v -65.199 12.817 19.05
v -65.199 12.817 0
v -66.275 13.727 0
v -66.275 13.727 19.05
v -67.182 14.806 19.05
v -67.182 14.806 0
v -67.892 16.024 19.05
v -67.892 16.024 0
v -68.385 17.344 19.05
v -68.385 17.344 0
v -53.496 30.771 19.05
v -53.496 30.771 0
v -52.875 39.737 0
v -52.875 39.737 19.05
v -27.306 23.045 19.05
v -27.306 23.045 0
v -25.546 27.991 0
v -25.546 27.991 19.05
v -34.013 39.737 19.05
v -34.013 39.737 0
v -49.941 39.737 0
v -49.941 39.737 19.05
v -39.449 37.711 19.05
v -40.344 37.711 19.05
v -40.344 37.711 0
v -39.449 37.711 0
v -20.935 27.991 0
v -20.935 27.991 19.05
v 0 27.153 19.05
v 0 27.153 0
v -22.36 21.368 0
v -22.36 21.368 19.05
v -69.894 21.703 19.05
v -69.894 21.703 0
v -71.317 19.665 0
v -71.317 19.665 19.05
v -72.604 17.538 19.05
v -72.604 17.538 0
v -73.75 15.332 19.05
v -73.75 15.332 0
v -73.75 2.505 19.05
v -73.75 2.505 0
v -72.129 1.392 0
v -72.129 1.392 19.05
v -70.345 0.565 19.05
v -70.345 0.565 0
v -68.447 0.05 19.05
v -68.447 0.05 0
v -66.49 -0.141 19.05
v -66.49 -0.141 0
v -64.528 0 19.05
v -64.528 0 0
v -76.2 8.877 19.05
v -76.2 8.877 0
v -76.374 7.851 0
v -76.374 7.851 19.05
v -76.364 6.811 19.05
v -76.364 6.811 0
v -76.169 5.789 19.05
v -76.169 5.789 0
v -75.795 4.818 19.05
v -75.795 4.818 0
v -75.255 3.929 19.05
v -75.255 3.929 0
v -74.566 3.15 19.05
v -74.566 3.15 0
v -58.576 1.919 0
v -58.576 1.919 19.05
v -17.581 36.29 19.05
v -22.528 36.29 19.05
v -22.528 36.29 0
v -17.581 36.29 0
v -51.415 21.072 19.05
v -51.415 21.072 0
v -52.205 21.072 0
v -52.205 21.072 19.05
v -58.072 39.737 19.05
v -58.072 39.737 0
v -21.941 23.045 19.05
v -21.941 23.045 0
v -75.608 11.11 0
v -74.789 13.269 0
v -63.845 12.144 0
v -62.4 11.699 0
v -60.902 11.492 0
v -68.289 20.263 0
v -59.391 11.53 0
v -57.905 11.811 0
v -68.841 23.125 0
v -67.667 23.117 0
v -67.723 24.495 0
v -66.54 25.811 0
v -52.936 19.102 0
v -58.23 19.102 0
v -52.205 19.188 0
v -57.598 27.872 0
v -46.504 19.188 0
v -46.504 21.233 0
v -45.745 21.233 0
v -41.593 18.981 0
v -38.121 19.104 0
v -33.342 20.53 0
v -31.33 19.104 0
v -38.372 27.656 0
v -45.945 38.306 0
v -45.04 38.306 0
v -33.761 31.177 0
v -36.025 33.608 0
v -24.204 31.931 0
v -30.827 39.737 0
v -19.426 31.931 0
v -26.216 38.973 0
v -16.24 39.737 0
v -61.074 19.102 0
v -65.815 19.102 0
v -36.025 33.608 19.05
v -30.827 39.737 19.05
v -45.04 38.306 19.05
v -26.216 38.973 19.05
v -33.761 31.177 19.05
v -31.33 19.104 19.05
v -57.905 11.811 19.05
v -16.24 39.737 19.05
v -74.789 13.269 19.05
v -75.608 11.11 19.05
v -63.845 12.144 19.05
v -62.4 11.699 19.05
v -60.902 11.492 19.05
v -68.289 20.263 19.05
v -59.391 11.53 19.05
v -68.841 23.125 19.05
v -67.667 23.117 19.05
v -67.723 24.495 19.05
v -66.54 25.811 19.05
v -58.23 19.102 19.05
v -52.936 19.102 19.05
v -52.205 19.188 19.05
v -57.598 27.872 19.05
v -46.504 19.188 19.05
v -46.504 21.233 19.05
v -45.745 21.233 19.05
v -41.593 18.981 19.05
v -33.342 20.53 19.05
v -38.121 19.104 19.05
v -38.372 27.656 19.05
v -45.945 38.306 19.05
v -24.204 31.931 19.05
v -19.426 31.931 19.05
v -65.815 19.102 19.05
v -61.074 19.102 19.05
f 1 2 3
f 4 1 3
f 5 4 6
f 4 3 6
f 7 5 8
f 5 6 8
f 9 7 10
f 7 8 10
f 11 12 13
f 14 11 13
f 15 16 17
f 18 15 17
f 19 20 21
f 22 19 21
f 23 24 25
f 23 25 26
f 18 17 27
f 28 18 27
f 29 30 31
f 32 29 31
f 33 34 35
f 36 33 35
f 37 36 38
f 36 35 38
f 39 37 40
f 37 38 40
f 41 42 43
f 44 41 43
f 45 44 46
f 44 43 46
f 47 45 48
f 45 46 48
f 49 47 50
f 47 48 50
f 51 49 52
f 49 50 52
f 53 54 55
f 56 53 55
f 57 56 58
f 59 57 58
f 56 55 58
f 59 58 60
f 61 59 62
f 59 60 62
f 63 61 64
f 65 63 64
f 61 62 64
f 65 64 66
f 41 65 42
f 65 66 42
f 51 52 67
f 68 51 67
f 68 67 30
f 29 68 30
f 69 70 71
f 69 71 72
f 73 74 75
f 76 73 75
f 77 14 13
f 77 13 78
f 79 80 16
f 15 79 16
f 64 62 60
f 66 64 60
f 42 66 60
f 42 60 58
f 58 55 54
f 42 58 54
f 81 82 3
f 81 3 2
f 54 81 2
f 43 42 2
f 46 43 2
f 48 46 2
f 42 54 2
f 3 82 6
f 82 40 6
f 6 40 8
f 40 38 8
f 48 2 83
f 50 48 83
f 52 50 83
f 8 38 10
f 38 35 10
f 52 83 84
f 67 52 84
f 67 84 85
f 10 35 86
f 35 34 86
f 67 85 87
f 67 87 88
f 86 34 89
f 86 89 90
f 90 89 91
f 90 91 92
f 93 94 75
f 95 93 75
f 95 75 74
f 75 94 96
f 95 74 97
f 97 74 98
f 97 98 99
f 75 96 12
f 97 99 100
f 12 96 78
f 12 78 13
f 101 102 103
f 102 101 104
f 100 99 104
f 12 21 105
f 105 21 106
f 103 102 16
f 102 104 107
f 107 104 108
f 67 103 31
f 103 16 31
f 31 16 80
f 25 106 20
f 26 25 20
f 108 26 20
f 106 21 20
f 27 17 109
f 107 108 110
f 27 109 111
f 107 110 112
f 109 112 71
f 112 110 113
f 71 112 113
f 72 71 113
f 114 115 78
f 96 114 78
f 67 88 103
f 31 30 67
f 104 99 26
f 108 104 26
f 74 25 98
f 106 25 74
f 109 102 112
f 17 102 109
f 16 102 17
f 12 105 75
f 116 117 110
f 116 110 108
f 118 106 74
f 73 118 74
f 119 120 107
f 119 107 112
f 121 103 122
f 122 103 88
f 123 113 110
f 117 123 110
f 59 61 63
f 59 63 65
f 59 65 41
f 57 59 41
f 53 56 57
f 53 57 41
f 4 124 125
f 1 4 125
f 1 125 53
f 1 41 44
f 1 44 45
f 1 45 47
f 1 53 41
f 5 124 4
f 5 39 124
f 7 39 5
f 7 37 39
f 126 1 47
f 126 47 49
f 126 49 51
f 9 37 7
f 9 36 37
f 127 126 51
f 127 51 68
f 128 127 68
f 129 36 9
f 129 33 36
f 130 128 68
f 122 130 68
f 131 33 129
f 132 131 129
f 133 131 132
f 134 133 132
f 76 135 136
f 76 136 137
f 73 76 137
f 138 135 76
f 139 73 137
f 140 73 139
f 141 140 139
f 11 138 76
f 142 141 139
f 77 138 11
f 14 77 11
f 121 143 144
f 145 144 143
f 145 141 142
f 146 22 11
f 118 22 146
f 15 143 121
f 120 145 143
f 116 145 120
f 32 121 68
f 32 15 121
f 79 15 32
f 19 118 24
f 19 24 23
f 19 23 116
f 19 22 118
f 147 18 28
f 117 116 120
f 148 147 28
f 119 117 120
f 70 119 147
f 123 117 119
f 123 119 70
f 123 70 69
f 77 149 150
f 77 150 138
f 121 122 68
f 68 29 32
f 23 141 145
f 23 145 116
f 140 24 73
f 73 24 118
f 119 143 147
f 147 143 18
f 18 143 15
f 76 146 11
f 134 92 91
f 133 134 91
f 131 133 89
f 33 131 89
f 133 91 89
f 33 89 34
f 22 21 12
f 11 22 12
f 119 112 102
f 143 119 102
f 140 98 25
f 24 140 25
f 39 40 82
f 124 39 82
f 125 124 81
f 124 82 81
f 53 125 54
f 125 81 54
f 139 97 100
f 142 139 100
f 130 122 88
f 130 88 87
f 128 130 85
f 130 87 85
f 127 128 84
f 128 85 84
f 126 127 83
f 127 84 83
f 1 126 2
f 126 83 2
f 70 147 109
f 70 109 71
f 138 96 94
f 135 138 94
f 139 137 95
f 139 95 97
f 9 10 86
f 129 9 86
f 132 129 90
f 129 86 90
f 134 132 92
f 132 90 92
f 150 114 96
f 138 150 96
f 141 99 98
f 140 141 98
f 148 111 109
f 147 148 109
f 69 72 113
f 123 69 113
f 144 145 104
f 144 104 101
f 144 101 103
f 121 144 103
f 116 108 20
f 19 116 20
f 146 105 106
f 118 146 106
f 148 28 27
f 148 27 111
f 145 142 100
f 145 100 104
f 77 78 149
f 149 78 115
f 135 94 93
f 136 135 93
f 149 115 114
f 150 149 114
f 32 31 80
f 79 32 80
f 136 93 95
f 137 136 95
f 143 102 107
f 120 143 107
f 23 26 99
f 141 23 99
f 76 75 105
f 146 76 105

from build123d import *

# Parameters (mm, degrees)
F1_DEPTH = 19.05
F3_DEPTH = 19.05


# Not quite as in the source:
# - a feature names something its author has since deleted; it is built from what else it names


with BuildPart() as f1:
    # F0 (on Top) → F1 (new body)
    with BuildSketch(Plane.XY):
        Polygon((-39.6296493709, 39.737109375), (-44.4920025766, 39.737109375), (-45.0404509902, 38.3060877886), (-51.4150857925, 21.0715923085), (-52.2047057748, 19.1882997751), (-47.2585186362, 19.1882997751), (-46.5040132403, 21.2327073224), (-40.3436794877, 37.7105511725), align=None)
    extrude(amount=F1_DEPTH)



with BuildPart() as f1b:
    # F0 (on Top) → F1, piece 2 (new body)
    with BuildSketch(Plane.XY):
        Polygon((-52.8753772378, 39.737109375), (-58.071937412, 39.737109375), (-65.8153370023, 19.1017910838), (-61.0744804144, 19.1017910838), (-57.5978495181, 27.8723798692), (-58.2299642265, 19.1017910838), (-52.9360063374, 19.1017910838), (-52.2047057748, 21.0715923085), (-45.9454512168, 38.3060877886), (-45.4141758382, 39.737109375), (-49.9411970377, 39.737109375), (-53.4955092069, 30.7705519863), align=None)
    extrude(amount=F1_DEPTH)


with BuildPart() as f1c:
    # F0 (on Top) → F1, piece 3 (new body)
    with BuildSketch(Plane.XY):
        with BuildLine():
            Line((-34.012787044, 39.737109375), (-38.875143975, 39.737109375))
            Line((-38.875143975, 39.737109375), (-39.4490547478, 37.7105511725))
            Line((-39.4490547478, 37.7105511725), (-45.7450146313, 21.2327073224))
            Line((-45.7450146313, 21.2327073224), (-46.5040132403, 19.1882997751))
            Line((-46.5040132403, 19.1882997751), (-41.5926604458, 18.9808556717))
            Line((-41.5926604458, 18.9808556717), (-38.3721441031, 27.6555065066))
            Line((-38.3721441031, 27.6555065066), (-38.1206423044, 19.1044658422))
            Line((-38.1206423044, 19.1044658422), (-31.3301086426, 19.1044658422))
            Line((-31.3301086426, 19.1044658422), (-57.9053983092, 11.8109323084))
            ThreePointArc((-57.9053983092, 11.8109323084), (-61.6554191389, 11.565355508), (-65.1989355683, 12.816936709))
            ThreePointArc((-65.1989355683, 12.816936709), (-67.1816299808, 14.8061054603), (-68.3846175671, 17.3439569771))
            ThreePointArc((-68.3846175671, 17.3439569771), (-68.0426528163, 21.7039427005), (-66.5402710438, 25.8111637086))
            ThreePointArc((-66.5402710438, 25.8111637086), (-68.289988101, 23.8168641952), (-69.8936209083, 21.7033121735))
            ThreePointArc((-69.8936209083, 21.7033121735), (-71.9777744598, 18.6120372362), (-73.74997437, 15.331948176))
            ThreePointArc((-73.74997437, 15.331948176), (-75.226699634, 12.199885885), (-76.2, 8.8767521083))
            ThreePointArc((-76.2, 8.8767521083), (-76.0035829361, 5.2955374253), (-73.74997437, 2.505389275))
            ThreePointArc((-73.74997437, 2.505389275), (-69.4068023904, 0.267420013), (-64.5282641053, 0))
            Line((-64.5282641053, 0), (-58.5760697722, 1.9185534911))
            Line((-58.5760697722, 1.9185534911), (0, 27.1525029093))
            Line((0, 27.1525029093), (-22.3599020392, 21.367976442))
            Line((-22.3599020392, 21.367976442), (-21.9407342374, 23.0446513742))
            Line((-21.9407342374, 23.0446513742), (-27.3060910404, 23.0446513742))
            Line((-27.3060910404, 23.0446513742), (-25.5455821753, 27.9908403754))
            Line((-25.5455821753, 27.9908403754), (-20.9347270429, 27.9908403754))
            Line((-20.9347270429, 27.9908403754), (-19.4257199764, 31.9310240448))
            Line((-19.4257199764, 31.9310240448), (-24.2042429745, 31.9310240448))
            Line((-24.2042429745, 31.9310240448), (-22.5275680423, 36.2903773785))
            Line((-22.5275680423, 36.2903773785), (-17.5813790411, 36.2903773785))
            Line((-17.5813790411, 36.2903773785), (-16.2400398403, 39.737109375))
            Line((-16.2400398403, 39.737109375), (-30.827106908, 39.737109375))
            Line((-30.827106908, 39.737109375), (-36.0247977078, 33.607698977))
            Line((-36.0247977078, 33.607698977), (-34.012787044, 39.737109375))
        make_face()
        Polygon((-26.2162536383, 38.9730595052), (-33.3421193063, 20.5296389759), (-33.7612889707, 31.1765223742), align=None, mode=Mode.SUBTRACT)
    extrude(amount=F1_DEPTH)


with BuildPart() as f1_1:
    add(f1.part)

    add(f1b.part)  # F3 merges F1b

    add(f1c.part)  # F3 merges F1c
    # F2 (on Top) → F3 (join, through all)
    with BuildSketch(Plane.XY):
        Polygon((-39.4490547478, 37.7105511725), (-38.875143975, 39.737109375), (-39.6296493709, 39.737109375), (-40.3436794877, 37.7105511725), align=None)
        Polygon((-46.5040132403, 19.1882997751), (-45.7450146313, 21.2327073224), (-46.5040132403, 21.2327073224), (-47.2585186362, 19.1882997751), align=None)
        Polygon((-52.2047057748, 19.1882997751), (-51.4150857925, 21.0715923085), (-52.2047057748, 21.0715923085), (-52.9360063374, 19.1017910838), align=None)
        Polygon((-45.0404509902, 38.3060877886), (-44.4920025766, 39.737109375), (-45.4141758382, 39.737109375), (-45.9454512168, 38.3060877886), align=None)
    extrude(amount=F3_DEPTH)


solid = f1_1.part
